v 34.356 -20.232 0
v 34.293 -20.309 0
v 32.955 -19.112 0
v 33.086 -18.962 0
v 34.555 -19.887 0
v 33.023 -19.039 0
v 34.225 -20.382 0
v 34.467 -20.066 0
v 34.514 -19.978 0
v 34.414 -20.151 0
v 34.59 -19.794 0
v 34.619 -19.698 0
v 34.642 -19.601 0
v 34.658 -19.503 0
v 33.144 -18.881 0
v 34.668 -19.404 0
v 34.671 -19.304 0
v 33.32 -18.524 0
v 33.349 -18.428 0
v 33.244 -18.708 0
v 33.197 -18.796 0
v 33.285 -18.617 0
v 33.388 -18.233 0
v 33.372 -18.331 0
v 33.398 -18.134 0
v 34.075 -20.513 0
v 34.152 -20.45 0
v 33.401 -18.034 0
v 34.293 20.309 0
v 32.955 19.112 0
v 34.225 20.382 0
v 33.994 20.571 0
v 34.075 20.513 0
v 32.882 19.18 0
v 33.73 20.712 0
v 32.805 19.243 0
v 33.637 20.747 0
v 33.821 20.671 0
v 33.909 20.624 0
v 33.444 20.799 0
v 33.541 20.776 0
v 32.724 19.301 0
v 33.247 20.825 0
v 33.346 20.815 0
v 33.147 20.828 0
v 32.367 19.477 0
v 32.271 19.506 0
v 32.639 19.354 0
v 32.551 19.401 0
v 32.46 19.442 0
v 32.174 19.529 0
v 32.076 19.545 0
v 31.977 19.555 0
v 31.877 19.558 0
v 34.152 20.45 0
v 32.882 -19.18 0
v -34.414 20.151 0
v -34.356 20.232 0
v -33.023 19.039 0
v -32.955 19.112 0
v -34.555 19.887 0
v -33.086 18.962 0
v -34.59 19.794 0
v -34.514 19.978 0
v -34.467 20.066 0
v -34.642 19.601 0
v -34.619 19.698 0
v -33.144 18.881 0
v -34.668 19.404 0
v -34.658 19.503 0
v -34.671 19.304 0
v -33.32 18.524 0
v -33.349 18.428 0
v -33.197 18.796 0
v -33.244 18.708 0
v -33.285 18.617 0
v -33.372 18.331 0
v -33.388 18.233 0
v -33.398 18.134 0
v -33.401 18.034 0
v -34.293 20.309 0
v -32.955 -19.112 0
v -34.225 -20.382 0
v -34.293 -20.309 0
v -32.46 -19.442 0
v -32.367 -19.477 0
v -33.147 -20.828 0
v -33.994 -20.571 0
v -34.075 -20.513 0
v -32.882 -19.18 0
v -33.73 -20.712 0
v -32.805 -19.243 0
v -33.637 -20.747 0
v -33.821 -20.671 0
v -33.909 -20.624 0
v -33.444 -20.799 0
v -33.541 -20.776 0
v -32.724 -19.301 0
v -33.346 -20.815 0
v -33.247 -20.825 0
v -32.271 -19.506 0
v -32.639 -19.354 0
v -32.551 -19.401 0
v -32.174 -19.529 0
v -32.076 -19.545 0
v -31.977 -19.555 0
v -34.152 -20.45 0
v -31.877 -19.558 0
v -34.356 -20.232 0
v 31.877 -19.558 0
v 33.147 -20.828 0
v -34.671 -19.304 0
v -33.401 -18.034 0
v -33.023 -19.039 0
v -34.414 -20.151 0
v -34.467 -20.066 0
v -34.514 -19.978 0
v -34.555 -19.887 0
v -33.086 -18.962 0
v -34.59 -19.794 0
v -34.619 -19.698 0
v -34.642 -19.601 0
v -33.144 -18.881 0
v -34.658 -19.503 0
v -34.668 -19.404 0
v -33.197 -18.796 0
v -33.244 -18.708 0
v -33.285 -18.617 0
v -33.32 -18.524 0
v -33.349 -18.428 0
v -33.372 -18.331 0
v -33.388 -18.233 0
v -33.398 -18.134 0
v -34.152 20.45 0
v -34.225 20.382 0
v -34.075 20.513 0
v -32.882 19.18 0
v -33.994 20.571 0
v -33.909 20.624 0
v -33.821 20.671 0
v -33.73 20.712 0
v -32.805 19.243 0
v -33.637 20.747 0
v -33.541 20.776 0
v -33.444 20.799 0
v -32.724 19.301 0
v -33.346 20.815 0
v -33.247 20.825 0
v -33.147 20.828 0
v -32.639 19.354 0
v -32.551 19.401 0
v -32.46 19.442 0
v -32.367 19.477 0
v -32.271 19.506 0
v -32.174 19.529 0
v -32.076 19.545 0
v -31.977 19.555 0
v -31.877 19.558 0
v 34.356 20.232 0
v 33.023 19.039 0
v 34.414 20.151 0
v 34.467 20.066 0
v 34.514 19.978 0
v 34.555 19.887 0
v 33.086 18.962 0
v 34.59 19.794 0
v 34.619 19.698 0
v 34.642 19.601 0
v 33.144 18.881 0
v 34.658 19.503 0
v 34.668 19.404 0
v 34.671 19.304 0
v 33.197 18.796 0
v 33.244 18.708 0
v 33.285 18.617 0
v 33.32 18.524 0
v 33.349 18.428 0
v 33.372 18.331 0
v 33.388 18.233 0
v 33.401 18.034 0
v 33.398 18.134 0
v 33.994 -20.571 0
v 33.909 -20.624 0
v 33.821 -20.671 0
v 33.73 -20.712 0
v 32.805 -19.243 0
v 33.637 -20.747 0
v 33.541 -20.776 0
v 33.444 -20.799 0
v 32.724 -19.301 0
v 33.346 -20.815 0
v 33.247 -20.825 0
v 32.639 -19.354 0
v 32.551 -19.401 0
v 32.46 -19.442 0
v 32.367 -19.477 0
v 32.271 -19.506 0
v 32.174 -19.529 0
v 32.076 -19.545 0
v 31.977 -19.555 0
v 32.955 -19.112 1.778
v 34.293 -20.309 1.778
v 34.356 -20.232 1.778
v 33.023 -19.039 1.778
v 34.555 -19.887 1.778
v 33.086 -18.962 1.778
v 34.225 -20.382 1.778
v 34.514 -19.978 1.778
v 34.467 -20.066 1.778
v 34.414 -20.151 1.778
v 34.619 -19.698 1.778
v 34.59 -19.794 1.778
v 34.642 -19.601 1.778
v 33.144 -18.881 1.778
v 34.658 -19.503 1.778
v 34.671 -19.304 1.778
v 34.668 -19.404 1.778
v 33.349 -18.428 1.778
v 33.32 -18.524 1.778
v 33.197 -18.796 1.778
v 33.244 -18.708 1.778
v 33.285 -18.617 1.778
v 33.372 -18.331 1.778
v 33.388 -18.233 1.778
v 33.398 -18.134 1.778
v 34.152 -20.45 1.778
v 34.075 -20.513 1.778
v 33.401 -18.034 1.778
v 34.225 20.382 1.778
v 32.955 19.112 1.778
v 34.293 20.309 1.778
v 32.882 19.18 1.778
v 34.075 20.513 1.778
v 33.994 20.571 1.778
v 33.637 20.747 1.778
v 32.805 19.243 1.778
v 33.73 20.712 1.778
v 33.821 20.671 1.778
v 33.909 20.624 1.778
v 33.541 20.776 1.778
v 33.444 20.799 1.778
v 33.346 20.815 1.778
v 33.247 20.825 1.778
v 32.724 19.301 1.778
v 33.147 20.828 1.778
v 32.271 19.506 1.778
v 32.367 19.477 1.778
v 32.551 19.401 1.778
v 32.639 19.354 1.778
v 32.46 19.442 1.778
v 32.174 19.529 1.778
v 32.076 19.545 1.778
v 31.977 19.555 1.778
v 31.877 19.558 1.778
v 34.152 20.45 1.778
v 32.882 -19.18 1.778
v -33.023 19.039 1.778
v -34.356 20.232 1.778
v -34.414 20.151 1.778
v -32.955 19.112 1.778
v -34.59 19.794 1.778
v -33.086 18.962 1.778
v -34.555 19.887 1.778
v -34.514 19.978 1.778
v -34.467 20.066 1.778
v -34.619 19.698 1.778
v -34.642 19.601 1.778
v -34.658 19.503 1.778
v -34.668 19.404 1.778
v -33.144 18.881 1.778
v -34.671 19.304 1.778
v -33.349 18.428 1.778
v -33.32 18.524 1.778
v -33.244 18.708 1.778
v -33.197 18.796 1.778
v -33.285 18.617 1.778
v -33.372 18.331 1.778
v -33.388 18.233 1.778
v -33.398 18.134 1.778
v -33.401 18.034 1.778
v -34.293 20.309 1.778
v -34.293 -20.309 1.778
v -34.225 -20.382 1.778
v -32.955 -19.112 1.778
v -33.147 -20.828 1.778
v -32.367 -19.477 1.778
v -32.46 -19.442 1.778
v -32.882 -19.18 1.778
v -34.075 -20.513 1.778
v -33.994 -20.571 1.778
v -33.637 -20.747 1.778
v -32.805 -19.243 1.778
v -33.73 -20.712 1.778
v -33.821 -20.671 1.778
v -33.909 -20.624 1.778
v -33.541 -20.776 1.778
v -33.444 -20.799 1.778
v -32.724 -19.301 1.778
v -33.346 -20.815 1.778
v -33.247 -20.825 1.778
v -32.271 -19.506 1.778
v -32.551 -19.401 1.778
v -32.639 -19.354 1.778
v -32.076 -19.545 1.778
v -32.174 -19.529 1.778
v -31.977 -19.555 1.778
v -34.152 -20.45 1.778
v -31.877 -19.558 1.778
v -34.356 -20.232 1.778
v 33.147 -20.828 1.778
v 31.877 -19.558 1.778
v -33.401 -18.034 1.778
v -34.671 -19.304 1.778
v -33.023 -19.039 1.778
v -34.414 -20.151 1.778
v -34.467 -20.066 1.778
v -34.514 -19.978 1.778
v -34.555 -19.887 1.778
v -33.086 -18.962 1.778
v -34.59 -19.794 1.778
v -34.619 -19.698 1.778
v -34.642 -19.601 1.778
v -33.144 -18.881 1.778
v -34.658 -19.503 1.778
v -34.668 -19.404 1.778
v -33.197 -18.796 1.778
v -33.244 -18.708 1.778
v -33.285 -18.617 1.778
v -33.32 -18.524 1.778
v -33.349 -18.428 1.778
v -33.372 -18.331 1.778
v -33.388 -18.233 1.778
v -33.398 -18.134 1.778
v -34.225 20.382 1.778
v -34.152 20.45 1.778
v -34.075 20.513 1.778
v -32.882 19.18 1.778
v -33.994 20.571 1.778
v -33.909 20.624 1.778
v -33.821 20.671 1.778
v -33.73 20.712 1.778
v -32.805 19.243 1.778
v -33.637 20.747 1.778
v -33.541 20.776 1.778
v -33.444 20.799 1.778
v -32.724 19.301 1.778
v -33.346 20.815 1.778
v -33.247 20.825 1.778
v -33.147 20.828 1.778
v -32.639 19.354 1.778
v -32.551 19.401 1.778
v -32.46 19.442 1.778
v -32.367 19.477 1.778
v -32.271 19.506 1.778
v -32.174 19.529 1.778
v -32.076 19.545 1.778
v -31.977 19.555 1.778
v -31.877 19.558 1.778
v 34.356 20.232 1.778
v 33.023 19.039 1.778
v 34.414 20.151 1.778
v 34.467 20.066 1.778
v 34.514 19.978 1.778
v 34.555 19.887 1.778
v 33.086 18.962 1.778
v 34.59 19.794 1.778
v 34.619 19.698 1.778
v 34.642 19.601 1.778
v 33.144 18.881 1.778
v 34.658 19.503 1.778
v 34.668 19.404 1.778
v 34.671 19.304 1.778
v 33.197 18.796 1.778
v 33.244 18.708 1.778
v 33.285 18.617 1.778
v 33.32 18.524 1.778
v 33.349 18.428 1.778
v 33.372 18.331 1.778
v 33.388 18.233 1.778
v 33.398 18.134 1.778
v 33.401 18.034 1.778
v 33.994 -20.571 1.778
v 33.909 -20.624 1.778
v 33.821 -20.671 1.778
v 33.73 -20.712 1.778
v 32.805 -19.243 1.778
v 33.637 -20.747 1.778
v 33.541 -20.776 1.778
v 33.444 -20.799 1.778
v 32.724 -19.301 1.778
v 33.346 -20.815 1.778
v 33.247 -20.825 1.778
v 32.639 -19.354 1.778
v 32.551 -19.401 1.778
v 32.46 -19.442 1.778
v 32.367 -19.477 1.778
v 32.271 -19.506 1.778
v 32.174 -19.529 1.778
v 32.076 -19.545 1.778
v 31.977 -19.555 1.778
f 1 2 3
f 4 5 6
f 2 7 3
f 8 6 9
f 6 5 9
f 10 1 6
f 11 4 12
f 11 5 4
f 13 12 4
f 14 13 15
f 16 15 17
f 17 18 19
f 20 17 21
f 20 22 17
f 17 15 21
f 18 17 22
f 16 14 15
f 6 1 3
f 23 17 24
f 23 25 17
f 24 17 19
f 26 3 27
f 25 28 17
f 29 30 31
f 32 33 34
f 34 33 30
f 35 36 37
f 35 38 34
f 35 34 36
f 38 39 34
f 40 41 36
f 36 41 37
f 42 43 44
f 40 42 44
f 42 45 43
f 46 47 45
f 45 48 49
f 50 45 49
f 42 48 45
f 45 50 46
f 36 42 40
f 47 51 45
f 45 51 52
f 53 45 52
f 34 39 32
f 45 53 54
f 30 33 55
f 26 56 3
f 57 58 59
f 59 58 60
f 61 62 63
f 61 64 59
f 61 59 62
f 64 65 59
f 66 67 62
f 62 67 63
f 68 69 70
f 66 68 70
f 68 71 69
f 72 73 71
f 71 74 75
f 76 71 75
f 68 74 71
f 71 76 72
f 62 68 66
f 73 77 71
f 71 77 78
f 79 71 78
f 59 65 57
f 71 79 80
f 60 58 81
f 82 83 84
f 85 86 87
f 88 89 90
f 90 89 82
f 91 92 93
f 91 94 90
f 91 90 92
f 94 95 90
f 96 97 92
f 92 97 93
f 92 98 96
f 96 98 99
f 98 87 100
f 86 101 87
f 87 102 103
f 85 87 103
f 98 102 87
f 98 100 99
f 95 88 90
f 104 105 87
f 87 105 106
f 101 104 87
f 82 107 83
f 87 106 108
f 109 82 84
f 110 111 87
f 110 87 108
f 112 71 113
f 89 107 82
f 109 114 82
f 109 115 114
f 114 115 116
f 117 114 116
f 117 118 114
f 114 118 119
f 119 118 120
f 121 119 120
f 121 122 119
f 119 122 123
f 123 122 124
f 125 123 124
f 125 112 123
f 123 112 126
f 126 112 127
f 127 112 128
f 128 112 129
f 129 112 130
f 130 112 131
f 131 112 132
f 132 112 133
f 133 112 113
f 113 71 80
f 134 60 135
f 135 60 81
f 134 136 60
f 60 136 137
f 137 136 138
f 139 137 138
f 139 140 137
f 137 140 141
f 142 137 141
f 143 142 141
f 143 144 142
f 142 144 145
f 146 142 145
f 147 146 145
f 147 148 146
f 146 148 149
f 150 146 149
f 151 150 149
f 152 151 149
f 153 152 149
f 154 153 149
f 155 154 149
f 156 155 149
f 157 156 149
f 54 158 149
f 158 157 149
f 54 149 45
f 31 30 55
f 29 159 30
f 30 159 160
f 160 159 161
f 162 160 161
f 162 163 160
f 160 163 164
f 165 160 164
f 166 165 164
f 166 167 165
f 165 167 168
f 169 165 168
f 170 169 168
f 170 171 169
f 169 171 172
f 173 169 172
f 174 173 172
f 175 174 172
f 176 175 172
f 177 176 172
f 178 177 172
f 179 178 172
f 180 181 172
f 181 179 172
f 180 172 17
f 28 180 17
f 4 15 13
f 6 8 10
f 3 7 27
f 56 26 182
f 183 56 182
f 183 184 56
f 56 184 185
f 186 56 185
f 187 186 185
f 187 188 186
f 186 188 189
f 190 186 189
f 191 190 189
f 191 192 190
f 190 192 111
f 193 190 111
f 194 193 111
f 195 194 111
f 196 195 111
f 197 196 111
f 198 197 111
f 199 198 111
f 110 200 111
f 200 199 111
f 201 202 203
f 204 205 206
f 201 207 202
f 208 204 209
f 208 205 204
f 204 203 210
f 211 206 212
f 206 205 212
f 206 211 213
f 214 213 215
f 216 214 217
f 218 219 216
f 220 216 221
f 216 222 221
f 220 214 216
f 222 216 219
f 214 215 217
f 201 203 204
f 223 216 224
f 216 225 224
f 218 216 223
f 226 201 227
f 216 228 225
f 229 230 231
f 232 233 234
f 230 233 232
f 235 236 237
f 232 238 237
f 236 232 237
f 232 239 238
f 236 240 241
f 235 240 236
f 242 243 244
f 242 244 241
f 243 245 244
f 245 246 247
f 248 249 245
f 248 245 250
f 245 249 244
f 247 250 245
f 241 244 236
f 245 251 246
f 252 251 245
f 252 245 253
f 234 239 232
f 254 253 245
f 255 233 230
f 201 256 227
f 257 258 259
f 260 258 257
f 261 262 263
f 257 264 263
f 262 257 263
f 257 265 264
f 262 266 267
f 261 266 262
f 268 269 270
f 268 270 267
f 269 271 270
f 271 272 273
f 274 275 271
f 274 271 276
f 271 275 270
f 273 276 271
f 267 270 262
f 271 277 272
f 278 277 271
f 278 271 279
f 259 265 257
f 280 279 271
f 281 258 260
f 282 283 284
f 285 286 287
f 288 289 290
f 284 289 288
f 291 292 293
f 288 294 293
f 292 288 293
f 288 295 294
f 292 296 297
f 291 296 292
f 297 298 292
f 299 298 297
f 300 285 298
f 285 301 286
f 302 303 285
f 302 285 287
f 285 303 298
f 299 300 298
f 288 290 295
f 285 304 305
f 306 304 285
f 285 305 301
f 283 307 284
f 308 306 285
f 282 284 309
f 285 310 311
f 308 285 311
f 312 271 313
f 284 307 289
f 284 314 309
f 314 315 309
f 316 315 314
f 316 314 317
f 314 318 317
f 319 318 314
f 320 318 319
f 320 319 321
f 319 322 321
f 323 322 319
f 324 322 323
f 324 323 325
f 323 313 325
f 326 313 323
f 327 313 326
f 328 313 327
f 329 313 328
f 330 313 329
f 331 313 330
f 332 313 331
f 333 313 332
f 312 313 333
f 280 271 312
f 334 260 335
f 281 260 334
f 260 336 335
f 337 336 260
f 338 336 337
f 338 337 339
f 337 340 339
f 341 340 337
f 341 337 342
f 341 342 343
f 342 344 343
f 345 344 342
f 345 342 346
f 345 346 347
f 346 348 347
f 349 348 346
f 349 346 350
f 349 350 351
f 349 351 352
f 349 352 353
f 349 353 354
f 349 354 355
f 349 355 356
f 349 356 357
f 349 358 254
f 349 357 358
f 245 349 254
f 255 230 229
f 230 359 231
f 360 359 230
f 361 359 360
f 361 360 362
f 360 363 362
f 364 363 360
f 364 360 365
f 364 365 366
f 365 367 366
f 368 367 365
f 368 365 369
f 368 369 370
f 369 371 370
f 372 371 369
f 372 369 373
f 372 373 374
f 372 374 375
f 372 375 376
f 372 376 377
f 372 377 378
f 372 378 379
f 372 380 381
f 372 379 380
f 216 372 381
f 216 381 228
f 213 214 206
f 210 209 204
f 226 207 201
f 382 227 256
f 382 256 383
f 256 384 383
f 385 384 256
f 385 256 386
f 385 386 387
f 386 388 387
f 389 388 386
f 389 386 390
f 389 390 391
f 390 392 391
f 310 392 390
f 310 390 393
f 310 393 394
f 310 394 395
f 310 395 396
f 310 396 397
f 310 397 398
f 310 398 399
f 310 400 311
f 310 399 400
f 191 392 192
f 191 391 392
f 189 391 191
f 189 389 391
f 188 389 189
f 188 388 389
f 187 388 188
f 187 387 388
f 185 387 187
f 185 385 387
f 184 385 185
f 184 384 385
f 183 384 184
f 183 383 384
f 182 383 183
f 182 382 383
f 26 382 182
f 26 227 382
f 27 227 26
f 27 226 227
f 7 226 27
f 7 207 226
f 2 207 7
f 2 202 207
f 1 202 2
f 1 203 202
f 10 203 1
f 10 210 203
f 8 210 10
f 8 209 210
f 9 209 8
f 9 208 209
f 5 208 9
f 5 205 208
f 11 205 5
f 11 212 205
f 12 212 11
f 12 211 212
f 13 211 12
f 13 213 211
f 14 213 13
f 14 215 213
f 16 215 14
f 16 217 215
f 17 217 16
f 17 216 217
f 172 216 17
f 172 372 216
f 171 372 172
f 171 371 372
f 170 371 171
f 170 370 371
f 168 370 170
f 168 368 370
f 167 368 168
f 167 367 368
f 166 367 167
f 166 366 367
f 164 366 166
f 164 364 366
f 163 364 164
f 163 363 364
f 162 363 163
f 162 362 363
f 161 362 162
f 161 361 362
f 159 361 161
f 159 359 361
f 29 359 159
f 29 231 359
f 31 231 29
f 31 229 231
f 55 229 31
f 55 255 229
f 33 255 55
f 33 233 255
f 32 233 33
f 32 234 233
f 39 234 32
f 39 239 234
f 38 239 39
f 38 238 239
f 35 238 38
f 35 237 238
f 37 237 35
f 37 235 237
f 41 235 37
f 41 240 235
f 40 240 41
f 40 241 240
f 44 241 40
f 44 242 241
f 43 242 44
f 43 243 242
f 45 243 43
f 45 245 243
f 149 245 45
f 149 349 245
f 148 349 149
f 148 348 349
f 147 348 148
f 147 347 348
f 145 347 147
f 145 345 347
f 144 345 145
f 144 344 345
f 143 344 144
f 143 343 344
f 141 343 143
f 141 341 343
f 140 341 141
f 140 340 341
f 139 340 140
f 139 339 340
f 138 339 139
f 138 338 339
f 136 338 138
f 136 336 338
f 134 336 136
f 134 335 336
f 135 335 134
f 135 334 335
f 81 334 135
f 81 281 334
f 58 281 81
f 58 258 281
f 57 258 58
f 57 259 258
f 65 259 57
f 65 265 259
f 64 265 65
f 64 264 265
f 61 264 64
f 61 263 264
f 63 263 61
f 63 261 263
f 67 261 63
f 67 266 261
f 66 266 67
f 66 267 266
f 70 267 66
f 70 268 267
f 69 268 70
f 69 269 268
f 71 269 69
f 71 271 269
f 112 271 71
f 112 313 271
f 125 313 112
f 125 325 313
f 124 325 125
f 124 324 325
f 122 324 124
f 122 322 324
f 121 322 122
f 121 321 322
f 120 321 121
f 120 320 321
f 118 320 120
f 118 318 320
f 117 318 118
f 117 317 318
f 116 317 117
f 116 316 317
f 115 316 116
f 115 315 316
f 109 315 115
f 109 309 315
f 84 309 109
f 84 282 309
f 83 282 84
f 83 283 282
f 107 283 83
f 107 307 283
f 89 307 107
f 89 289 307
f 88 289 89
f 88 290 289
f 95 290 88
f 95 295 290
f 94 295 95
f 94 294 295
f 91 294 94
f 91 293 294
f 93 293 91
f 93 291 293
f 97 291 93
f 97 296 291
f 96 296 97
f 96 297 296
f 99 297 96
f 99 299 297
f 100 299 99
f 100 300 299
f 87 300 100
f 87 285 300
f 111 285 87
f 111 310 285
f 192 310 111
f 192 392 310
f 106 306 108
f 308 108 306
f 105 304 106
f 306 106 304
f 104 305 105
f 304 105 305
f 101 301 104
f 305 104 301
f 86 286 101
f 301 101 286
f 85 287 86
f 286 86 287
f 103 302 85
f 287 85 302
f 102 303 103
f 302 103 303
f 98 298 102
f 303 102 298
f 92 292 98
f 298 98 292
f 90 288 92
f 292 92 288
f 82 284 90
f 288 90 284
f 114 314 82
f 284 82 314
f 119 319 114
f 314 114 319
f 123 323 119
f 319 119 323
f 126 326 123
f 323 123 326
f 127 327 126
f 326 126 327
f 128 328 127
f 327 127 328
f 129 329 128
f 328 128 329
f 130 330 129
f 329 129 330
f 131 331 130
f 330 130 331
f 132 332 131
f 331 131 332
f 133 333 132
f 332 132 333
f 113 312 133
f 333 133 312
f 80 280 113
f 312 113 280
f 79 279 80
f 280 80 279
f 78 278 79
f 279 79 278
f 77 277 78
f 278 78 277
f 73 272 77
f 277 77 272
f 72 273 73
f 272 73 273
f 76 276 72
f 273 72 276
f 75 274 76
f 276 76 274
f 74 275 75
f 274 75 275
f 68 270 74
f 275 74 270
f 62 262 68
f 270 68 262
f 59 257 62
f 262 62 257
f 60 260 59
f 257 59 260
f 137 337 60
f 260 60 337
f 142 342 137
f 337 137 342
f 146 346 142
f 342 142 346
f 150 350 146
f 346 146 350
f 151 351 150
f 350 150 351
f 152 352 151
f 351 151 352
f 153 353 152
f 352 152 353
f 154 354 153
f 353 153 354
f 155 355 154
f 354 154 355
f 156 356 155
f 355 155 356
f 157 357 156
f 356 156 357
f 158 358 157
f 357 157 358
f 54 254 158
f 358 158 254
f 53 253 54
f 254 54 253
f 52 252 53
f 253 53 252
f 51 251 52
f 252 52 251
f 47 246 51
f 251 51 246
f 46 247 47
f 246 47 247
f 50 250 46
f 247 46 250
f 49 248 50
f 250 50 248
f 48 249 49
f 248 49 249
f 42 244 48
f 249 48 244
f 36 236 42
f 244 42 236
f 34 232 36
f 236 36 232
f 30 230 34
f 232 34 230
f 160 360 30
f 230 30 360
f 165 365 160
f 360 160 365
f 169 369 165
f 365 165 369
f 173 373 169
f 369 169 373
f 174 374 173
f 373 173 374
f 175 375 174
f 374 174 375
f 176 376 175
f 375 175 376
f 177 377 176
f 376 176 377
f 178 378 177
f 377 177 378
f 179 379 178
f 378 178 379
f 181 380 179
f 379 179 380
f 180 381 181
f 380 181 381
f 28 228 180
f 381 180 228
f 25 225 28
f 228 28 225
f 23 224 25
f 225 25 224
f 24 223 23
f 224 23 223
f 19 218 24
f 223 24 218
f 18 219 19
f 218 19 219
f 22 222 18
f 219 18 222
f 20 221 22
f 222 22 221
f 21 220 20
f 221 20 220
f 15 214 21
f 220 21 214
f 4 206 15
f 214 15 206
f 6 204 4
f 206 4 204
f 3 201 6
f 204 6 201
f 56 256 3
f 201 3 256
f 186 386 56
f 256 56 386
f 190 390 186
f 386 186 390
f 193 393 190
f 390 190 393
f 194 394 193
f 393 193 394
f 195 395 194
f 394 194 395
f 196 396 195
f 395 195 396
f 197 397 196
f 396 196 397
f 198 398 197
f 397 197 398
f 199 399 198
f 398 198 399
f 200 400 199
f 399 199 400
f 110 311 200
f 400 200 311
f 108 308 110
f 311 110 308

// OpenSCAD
ViewScale = [0.0254, 0.0254, 0.0254];

module roundedTemplate(w,h)
{
    xoffset=w/2;
    yoffset=h/2;
    r=60;
    //square([3800, 2000], center=true);
    hull() {
        translate([xoffset-r, yoffset-r, 0])
        circle(r, $fn=96);
        translate([-xoffset+r, yoffset-r, 0])
        circle(r, $fn=96);
        translate([-xoffset+r, -yoffset+r, 0])
        circle(r, $fn=96);
        translate([xoffset-r, -yoffset+r, 0])
        circle(r, $fn=96);
    }
}

module cover()
{
    *translate([-2730/2,-1640/2])
    square([2730, 1640]);
    linear_extrude(70)
    difference() {
    roundedTemplate(2730,1640);
    roundedTemplate(2630,1540);
    }
}

scale(ViewScale)
{
    cover();
}
